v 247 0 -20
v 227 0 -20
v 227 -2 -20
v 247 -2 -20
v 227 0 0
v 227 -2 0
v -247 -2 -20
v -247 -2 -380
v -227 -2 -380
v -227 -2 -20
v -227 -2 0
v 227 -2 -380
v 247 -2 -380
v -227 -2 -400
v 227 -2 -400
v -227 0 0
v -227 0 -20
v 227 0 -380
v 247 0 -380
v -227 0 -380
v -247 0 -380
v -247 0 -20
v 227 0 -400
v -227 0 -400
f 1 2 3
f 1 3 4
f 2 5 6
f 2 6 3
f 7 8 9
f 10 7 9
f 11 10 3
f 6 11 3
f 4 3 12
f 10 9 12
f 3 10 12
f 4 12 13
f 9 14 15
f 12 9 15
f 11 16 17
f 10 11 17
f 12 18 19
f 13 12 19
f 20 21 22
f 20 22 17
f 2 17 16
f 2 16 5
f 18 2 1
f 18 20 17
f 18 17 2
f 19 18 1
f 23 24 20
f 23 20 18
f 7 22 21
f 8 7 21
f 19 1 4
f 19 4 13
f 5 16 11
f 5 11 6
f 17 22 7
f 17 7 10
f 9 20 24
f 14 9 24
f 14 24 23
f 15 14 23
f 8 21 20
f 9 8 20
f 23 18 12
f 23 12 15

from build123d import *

# Parameters (mm, degrees)
SKETCH2_W          = 494
SKETCH2_H          = 400
BASE_FLANGE1_DEPTH = 2
SKETCH7_W          = 20
SKETCH7_H          = 20
CUT_EXTRUDE1_DEPTH = 10


# Sheet-metal steps are written as plain solids
with BuildPart() as part:
    # Sketch2 → Base-Flange1 (new body)
    with BuildSketch(Plane(origin=(0, 0, 0), x_dir=(1, 0, 0), z_dir=(0, 1, 0))):
        with Locations((0, 200)):
            Rectangle(SKETCH2_W, SKETCH2_H)
    extrude(amount=-BASE_FLANGE1_DEPTH)

    # Sketch7 → Cut-Extrude1 (cut)
    with BuildSketch(Plane(origin=(0, 0, 0), x_dir=(1, 0, 0), z_dir=(0, 1, 0))):
        with Locations((-237, 390)):
            Rectangle(SKETCH7_W, SKETCH7_H)
        with Locations((-237, 10)):
            Rectangle(SKETCH7_W, SKETCH7_H)
        with Locations((237, 10)):
            Rectangle(SKETCH7_W, SKETCH7_H)
        with Locations((237, 390)):
            Rectangle(SKETCH7_W, SKETCH7_H)
    extrude(amount=-CUT_EXTRUDE1_DEPTH, mode=Mode.SUBTRACT)


solid = part.part
